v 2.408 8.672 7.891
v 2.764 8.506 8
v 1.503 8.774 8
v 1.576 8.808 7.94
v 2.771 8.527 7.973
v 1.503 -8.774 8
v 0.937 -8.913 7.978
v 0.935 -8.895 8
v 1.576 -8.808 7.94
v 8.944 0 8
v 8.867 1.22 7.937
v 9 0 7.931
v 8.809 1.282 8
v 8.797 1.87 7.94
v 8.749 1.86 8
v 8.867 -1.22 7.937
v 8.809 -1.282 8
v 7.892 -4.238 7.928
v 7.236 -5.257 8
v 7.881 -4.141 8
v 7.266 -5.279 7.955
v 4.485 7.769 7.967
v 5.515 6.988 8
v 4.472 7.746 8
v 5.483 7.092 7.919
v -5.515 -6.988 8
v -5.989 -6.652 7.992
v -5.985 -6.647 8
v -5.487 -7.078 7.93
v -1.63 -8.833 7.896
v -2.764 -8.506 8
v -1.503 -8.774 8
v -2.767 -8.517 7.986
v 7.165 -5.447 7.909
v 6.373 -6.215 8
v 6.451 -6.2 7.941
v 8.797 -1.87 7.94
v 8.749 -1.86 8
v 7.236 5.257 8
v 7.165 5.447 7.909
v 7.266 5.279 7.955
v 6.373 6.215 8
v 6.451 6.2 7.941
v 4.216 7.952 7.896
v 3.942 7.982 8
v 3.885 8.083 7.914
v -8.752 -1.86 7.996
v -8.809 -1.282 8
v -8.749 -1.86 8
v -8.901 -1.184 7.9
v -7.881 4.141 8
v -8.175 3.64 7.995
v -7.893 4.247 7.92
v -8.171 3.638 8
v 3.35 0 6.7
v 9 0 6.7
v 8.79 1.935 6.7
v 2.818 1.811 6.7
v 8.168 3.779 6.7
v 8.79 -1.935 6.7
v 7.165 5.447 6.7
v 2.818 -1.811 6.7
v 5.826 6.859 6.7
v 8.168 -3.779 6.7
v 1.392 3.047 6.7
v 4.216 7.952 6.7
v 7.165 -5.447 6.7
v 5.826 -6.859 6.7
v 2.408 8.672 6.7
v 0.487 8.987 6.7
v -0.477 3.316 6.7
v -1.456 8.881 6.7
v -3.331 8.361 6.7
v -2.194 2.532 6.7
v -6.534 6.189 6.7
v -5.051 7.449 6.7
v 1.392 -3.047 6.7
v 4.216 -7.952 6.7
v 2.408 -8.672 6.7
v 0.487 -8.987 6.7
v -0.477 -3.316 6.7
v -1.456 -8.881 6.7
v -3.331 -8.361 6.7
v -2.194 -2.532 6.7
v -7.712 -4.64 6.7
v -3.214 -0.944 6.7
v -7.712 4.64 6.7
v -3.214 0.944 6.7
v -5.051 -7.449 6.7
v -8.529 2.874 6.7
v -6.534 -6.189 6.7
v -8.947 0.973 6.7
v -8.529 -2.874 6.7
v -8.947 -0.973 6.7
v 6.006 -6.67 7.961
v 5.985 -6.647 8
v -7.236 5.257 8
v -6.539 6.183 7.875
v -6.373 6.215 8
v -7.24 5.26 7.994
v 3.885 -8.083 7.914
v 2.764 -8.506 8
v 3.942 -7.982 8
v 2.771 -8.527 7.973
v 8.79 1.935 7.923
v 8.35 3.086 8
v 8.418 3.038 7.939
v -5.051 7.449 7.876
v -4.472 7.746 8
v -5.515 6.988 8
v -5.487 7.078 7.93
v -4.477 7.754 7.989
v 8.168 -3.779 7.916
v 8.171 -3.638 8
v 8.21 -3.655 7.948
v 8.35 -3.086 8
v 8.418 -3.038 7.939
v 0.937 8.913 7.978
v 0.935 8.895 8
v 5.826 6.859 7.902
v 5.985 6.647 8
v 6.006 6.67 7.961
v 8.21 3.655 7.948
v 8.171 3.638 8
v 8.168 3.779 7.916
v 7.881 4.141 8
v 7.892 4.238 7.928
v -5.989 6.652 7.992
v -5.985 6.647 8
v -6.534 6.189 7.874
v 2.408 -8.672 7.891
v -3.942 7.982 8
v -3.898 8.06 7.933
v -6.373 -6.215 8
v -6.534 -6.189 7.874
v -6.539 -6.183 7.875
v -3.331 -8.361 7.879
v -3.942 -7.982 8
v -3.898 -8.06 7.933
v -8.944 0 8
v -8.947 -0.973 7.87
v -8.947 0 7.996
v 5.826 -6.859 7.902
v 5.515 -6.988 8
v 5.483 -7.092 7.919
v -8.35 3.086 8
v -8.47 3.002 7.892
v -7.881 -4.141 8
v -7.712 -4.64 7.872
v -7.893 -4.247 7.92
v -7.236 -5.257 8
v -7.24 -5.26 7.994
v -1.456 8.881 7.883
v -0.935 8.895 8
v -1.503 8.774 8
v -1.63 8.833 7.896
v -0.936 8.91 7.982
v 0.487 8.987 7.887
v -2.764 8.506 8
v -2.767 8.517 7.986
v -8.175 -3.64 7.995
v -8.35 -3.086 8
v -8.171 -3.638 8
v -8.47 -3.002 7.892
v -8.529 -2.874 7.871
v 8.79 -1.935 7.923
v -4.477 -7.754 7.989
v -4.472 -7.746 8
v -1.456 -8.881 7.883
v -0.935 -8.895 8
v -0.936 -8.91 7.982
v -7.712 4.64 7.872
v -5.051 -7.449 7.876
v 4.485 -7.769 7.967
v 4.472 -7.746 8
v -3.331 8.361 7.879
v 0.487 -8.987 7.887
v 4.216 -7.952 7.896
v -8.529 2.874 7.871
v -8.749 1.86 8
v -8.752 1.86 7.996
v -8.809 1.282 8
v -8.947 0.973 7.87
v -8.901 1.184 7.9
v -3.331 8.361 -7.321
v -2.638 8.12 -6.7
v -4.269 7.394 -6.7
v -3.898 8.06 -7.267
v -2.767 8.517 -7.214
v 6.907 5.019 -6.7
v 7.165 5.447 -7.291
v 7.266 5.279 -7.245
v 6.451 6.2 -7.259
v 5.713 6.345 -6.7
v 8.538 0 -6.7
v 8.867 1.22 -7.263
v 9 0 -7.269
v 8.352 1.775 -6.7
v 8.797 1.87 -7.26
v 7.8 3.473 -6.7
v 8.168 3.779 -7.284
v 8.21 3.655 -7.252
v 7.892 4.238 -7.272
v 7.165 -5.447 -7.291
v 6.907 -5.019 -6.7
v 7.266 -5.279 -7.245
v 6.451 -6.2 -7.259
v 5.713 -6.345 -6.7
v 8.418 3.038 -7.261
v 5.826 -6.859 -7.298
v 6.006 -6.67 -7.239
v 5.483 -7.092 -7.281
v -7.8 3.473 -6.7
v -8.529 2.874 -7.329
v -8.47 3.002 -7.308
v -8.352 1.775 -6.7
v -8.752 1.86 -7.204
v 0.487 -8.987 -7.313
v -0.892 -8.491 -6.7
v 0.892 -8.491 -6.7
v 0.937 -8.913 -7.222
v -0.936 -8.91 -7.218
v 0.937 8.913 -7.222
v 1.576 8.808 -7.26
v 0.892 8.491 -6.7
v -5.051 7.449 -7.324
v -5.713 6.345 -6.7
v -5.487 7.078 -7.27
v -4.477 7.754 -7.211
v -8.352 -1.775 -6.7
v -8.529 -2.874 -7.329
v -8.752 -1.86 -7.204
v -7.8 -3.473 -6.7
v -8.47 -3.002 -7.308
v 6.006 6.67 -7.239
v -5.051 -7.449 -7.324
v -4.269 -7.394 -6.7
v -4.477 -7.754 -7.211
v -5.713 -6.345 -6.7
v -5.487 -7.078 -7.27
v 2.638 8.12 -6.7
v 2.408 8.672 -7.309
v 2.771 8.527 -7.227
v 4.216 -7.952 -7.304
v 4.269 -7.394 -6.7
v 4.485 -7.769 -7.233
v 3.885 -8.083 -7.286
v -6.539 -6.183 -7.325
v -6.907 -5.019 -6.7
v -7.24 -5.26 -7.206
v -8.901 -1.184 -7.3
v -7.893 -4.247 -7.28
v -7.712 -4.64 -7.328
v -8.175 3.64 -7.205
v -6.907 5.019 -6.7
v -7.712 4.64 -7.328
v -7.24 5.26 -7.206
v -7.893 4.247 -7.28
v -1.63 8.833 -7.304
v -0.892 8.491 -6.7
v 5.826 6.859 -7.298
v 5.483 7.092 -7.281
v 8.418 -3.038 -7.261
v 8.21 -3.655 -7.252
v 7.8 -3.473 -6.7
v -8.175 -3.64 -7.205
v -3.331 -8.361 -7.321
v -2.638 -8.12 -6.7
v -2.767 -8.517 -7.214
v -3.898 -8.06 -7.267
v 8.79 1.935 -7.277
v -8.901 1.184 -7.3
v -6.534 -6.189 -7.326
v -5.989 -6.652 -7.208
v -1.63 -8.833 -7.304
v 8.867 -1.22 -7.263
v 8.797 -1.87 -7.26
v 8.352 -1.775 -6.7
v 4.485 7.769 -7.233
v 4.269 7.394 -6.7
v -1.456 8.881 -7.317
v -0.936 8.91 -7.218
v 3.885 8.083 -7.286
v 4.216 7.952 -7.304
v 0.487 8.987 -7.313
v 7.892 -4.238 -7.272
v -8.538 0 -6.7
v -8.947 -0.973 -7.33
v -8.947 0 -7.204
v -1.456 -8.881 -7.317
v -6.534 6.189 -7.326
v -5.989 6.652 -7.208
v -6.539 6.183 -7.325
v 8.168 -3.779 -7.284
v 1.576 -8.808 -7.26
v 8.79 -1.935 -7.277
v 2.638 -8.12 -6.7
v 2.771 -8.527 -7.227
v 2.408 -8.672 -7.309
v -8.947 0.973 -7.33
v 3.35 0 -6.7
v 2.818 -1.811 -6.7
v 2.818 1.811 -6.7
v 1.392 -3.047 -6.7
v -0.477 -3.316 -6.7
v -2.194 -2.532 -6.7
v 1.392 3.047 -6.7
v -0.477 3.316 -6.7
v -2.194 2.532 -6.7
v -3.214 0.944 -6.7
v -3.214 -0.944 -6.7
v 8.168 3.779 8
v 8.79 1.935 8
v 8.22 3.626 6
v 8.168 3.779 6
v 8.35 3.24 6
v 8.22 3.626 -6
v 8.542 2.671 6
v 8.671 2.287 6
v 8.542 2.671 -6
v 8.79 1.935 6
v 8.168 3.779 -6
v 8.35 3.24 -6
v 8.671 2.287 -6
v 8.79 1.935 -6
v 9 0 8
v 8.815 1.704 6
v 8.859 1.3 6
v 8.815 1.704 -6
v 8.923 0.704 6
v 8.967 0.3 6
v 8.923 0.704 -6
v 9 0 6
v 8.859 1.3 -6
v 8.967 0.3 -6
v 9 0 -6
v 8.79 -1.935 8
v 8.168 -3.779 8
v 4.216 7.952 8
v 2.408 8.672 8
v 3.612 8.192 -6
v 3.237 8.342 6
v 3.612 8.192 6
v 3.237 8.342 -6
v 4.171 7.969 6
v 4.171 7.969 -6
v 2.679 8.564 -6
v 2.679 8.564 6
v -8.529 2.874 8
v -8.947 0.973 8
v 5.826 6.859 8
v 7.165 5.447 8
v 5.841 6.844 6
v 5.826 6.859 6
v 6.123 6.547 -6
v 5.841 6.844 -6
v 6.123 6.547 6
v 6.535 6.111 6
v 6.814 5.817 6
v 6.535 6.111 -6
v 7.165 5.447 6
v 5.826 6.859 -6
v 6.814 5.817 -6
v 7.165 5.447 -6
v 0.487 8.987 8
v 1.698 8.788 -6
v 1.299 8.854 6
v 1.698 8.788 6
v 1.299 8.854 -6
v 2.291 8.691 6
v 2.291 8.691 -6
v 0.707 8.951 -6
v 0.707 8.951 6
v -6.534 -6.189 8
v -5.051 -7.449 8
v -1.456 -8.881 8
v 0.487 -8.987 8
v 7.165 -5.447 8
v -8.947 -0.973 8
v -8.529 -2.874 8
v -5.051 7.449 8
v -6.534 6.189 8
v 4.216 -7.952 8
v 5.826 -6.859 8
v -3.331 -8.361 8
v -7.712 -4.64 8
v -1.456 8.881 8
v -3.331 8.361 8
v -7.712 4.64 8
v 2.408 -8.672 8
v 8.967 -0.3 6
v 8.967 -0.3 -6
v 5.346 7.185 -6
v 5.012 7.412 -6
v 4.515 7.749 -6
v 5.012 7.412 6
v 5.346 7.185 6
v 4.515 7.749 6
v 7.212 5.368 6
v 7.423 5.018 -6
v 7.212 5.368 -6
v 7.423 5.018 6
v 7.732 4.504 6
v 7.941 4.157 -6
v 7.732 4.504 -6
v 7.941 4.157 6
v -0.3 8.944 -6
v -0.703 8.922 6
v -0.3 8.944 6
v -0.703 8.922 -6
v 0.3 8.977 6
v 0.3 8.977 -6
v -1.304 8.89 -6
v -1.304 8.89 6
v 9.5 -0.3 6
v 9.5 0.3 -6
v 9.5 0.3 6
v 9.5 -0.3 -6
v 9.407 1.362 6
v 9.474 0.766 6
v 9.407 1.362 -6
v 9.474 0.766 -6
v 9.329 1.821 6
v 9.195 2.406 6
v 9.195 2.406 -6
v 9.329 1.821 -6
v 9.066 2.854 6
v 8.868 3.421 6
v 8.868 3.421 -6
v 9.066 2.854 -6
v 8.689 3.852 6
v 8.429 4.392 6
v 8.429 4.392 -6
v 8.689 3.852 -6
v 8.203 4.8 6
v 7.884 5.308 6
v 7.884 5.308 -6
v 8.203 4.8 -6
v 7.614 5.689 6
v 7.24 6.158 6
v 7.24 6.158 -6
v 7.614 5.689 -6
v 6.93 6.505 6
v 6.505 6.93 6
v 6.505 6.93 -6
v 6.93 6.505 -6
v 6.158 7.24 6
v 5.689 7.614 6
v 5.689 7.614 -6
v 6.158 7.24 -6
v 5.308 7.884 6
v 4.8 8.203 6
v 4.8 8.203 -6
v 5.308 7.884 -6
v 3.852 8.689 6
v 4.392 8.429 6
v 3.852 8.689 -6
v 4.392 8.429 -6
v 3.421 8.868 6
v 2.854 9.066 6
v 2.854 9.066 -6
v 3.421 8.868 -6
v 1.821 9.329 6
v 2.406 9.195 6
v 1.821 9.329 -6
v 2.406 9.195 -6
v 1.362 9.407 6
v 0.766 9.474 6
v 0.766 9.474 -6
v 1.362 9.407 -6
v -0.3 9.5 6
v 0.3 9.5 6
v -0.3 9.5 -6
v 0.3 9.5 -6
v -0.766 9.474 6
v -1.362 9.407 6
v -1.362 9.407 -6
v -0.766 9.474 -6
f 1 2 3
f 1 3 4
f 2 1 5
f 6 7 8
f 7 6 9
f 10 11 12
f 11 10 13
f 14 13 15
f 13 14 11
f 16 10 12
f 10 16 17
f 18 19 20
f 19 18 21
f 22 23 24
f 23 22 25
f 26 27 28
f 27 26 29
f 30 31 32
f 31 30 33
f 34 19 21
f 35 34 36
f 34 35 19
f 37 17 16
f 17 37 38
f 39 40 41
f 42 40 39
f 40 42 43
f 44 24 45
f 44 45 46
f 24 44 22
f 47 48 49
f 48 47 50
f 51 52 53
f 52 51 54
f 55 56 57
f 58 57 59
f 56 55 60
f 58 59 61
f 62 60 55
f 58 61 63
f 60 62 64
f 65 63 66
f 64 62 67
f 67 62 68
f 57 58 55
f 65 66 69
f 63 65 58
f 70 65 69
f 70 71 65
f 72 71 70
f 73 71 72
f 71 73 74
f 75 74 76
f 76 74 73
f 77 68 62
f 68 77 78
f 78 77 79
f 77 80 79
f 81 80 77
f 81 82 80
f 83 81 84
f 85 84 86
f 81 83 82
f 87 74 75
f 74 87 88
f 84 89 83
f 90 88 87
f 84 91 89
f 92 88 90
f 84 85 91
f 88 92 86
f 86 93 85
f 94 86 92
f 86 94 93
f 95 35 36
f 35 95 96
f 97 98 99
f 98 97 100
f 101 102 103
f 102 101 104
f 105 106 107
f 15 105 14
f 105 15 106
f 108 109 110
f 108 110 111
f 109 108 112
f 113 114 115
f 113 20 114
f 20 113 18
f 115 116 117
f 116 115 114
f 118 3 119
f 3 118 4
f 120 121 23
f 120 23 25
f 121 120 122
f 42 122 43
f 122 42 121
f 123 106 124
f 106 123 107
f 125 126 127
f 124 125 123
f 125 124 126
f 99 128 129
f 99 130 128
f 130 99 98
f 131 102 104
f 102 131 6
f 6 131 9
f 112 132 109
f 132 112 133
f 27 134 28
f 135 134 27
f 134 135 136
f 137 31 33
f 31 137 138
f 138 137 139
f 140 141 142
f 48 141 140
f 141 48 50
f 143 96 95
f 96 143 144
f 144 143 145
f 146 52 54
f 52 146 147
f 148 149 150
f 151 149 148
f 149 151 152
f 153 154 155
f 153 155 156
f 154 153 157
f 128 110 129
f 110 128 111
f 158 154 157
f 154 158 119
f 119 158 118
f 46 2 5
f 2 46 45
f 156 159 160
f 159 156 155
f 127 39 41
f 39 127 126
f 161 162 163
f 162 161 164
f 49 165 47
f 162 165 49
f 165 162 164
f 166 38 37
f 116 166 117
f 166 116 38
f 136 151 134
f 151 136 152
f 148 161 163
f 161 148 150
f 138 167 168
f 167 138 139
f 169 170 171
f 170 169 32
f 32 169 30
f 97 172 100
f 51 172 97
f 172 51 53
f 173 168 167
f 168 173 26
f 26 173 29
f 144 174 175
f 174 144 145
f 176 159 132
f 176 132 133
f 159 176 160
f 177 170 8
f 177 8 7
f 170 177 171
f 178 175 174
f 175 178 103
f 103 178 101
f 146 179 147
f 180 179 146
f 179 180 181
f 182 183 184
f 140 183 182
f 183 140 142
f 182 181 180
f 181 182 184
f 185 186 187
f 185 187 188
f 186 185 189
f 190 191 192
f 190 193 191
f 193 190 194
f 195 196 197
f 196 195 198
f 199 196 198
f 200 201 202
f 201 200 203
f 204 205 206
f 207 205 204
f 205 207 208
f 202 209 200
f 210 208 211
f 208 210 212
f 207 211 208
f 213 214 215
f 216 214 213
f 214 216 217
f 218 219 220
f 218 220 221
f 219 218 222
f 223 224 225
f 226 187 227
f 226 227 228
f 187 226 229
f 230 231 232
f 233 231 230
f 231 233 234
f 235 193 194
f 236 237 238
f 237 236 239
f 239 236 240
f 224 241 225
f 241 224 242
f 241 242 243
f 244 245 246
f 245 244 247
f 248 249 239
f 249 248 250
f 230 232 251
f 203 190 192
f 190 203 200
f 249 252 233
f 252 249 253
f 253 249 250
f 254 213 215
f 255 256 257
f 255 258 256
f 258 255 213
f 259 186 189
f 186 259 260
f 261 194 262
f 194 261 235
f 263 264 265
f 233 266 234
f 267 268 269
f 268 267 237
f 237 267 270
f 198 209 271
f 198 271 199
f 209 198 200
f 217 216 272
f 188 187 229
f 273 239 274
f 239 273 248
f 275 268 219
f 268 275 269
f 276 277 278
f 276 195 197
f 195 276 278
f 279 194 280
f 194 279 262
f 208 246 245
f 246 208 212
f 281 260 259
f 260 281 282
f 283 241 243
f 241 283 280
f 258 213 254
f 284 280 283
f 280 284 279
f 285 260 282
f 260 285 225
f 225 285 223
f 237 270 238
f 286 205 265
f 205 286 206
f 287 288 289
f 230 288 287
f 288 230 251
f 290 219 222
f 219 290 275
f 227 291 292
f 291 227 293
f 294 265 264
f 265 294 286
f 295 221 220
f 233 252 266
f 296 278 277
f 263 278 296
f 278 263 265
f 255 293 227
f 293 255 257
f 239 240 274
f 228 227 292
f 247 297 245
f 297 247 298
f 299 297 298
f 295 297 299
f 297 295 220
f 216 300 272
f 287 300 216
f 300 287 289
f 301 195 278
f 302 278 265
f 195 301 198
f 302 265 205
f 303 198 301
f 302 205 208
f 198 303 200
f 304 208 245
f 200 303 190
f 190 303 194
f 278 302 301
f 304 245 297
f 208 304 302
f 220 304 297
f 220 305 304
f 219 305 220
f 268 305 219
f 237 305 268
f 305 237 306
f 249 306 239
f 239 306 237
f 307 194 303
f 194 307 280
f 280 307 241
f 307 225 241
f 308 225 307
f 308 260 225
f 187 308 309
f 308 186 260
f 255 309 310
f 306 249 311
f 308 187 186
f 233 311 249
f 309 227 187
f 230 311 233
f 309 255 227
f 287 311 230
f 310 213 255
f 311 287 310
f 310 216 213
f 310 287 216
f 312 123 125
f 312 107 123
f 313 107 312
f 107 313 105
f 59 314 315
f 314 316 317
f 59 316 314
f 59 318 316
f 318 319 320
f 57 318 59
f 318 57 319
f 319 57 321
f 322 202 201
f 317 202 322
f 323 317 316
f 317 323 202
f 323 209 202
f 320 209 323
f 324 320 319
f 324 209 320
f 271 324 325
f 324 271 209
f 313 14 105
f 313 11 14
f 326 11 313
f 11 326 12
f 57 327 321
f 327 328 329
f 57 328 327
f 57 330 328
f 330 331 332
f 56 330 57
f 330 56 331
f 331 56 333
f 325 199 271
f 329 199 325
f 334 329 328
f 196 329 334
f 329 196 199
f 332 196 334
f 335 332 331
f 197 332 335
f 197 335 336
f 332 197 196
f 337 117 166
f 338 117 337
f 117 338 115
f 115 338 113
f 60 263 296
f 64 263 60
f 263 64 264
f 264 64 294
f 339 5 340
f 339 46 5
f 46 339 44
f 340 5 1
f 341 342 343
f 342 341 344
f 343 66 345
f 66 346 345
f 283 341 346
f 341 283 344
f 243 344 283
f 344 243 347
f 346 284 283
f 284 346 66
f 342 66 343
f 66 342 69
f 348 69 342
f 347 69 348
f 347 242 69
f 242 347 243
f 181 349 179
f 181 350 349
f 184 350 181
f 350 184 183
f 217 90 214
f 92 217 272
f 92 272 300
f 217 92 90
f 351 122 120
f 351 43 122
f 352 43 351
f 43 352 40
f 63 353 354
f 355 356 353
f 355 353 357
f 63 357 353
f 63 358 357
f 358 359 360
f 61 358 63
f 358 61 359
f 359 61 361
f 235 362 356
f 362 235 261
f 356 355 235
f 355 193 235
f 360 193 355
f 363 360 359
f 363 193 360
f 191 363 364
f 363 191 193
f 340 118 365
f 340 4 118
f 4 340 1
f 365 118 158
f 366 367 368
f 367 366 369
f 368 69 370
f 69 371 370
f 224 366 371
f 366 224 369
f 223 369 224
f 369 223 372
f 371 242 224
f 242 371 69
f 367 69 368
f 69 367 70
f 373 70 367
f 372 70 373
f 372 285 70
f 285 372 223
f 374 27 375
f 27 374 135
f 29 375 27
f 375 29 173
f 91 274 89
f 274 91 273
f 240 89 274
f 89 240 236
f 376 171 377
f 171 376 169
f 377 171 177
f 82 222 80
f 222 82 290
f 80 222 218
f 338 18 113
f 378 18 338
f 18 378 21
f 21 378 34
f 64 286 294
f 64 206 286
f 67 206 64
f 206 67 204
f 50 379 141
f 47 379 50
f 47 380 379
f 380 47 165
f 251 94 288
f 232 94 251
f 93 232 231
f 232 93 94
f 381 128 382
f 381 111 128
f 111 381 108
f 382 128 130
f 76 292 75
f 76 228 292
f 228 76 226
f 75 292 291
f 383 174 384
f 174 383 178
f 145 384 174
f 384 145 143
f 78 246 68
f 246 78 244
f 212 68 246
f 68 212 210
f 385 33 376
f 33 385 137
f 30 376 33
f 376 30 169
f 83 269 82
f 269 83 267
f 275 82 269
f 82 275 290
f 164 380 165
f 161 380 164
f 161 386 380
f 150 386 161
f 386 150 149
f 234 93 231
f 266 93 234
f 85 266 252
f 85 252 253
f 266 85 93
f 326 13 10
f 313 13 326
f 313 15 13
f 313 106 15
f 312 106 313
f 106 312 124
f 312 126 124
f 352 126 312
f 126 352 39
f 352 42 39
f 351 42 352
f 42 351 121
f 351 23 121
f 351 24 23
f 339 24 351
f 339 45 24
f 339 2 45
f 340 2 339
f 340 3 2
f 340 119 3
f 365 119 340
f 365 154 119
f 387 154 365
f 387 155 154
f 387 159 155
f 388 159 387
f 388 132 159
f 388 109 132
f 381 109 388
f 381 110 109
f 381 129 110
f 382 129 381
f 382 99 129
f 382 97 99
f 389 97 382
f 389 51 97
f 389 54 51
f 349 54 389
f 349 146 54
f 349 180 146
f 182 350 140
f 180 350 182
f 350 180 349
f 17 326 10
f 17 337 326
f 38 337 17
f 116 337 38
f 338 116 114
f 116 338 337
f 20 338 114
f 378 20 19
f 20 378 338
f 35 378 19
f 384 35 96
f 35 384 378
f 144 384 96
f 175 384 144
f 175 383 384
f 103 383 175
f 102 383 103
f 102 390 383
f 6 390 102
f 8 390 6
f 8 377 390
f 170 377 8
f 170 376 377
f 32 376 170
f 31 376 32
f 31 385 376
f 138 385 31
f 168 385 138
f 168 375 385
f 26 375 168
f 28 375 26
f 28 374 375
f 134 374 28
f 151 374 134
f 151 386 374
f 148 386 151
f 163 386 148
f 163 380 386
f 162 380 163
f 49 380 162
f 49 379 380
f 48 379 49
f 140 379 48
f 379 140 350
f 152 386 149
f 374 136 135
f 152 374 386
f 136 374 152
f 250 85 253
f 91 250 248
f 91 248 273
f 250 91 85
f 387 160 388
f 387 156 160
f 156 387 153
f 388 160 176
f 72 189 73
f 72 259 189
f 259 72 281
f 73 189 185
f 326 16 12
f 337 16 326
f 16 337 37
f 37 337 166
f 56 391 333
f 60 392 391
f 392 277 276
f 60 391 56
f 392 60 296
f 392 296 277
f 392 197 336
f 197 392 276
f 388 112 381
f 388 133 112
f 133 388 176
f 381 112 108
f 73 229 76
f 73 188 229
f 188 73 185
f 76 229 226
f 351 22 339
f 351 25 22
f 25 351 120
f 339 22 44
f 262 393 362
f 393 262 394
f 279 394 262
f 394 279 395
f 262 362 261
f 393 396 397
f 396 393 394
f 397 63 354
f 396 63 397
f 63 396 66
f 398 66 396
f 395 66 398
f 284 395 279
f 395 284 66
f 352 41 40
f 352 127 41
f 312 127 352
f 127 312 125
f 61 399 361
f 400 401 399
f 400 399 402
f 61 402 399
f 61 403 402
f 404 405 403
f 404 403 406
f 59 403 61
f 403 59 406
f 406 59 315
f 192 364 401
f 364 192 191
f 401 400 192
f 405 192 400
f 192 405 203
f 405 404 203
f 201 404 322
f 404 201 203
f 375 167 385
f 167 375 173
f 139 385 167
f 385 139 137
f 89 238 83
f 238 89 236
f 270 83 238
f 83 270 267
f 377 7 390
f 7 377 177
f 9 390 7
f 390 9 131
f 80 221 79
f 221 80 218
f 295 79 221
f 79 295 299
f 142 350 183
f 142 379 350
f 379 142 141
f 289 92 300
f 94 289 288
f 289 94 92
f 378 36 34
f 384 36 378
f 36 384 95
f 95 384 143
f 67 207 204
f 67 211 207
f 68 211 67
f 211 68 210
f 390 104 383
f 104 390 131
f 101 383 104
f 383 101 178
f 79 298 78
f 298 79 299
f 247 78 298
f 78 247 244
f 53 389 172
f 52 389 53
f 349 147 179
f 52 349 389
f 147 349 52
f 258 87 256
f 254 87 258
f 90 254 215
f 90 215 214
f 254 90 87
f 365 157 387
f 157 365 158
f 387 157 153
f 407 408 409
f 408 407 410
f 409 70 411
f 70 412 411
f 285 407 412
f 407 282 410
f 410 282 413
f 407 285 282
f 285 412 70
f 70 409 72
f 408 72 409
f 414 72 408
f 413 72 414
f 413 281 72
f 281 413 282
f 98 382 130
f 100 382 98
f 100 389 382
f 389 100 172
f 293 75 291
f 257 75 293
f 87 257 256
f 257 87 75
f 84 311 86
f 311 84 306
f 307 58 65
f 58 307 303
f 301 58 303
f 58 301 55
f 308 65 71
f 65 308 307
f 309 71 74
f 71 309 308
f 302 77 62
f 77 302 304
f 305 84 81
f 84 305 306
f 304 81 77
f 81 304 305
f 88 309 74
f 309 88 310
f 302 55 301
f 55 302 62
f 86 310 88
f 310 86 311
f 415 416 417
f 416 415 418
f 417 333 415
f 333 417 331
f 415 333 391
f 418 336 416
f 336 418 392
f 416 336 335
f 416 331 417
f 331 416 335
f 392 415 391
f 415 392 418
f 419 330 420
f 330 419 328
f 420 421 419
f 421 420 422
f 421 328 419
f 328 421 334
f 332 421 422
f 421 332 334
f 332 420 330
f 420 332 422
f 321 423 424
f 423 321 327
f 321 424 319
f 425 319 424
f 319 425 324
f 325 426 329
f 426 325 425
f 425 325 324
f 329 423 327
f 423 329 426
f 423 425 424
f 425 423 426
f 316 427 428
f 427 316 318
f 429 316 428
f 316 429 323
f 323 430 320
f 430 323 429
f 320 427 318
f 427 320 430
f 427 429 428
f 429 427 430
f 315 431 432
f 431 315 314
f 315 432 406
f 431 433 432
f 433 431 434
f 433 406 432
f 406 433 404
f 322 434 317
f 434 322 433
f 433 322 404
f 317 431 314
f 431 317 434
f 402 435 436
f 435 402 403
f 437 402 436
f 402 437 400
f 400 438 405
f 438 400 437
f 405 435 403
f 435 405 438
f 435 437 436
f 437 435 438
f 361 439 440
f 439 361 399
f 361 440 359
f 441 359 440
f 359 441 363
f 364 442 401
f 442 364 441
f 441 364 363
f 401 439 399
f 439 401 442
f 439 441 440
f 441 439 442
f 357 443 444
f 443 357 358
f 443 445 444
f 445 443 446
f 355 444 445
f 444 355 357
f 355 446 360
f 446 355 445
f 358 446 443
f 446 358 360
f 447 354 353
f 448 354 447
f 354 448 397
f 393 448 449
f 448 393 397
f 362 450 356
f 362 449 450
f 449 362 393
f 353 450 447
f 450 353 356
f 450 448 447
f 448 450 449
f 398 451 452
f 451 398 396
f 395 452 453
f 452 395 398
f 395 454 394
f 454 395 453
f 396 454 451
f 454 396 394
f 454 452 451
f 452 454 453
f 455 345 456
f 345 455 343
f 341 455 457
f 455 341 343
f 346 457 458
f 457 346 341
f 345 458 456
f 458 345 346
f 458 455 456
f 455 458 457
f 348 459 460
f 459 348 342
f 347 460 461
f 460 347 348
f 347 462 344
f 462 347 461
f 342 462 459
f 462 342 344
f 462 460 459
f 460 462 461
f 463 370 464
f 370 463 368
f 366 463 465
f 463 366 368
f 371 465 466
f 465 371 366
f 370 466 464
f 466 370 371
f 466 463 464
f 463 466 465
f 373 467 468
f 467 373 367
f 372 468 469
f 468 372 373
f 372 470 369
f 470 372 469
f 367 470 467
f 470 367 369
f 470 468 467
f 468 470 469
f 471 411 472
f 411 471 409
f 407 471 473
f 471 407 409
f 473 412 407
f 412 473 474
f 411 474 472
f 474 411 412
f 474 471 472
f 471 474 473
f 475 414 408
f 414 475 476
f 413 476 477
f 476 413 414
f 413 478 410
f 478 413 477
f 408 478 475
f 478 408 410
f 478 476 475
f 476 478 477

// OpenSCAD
// Parameters
outer_diameter_mm = 18; //[9:36:0.1]
length_mm = 16; //[8:32:0.1]
screw_nominal_diameter_mm = 8; //[4:16:0.1]
internal_pitch_mm = 1.25; //[0.5:2.5:0.05]
internal_minor_diameter_mm = 6.7; //[3.35:13.4:0.05]
internal_tap_drill_diameter_mm = 6.8; //[3.4:13.6:0.05]
end_chamfer_mm = 0.8; //[0.4:1.6:0.05]
lead_in_chamfer_angle_deg = 30; //[15:60:1]
knurl_depth_mm = 0.5; //[0.25:1:0.05]
knurl_pitch_mm = 1; //[0.5:2:0.05]
knurl_ridge_width_mm = 0.6; //[0.3:1.2:0.05]
knurl_ridge_height_mm = 12; //[6:16:0.1]
knurl_band_offset_mm = 0; //[-2:2:0.1]
overlap_mm = 1; //[0.5:2:0.1]
bore_extra_length_mm = 2; //[1:4:0.1]

// Threaded Insert - complete geometry
module threaded_insert() {
  color([0.8, 0.6, 0.2]) { // Brass color
    // Insert body with chamfers
    difference() {
      // Main body
      cylinder(r=outer_diameter_mm/2, h=length_mm, center=true);
      
      // Internal bore
      translate([0, 0, 0])
        cylinder(r=internal_minor_diameter_mm/2, h=length_mm + bore_extra_length_mm, center=true);
      
      // Lead-in chamfers
      union() {
        translate([0, 0, length_mm/2 - end_chamfer_mm/2])
          cylinder(r1=outer_diameter_mm/2 + overlap_mm, r2=outer_diameter_mm/2 - end_chamfer_mm*tan(lead_in_chamfer_angle_deg), h=end_chamfer_mm + overlap_mm, center=true);
        translate([0, 0, -length_mm/2 + end_chamfer_mm/2])
          cylinder(r1=outer_diameter_mm/2 + overlap_mm, r2=outer_diameter_mm/2 - end_chamfer_mm*tan(lead_in_chamfer_angle_deg), h=end_chamfer_mm + overlap_mm, center=true);
      }
    }
    
    // Knurl ridges
    union() {
      for (i = [0:15]) {
        rotate([0, 0, i*360/(floor((PI*outer_diameter_mm)/knurl_pitch_mm))])
          translate([outer_diameter_mm/2 + (knurl_depth_mm + overlap_mm)/2 - overlap_mm, 0, knurl_band_offset_mm])
            cube([knurl_depth_mm + overlap_mm, knurl_ridge_width_mm, knurl_ridge_height_mm], center=true);
      }
    }
  }
}

// Assembly
module assembly() {
  threaded_insert();
}

assembly();
